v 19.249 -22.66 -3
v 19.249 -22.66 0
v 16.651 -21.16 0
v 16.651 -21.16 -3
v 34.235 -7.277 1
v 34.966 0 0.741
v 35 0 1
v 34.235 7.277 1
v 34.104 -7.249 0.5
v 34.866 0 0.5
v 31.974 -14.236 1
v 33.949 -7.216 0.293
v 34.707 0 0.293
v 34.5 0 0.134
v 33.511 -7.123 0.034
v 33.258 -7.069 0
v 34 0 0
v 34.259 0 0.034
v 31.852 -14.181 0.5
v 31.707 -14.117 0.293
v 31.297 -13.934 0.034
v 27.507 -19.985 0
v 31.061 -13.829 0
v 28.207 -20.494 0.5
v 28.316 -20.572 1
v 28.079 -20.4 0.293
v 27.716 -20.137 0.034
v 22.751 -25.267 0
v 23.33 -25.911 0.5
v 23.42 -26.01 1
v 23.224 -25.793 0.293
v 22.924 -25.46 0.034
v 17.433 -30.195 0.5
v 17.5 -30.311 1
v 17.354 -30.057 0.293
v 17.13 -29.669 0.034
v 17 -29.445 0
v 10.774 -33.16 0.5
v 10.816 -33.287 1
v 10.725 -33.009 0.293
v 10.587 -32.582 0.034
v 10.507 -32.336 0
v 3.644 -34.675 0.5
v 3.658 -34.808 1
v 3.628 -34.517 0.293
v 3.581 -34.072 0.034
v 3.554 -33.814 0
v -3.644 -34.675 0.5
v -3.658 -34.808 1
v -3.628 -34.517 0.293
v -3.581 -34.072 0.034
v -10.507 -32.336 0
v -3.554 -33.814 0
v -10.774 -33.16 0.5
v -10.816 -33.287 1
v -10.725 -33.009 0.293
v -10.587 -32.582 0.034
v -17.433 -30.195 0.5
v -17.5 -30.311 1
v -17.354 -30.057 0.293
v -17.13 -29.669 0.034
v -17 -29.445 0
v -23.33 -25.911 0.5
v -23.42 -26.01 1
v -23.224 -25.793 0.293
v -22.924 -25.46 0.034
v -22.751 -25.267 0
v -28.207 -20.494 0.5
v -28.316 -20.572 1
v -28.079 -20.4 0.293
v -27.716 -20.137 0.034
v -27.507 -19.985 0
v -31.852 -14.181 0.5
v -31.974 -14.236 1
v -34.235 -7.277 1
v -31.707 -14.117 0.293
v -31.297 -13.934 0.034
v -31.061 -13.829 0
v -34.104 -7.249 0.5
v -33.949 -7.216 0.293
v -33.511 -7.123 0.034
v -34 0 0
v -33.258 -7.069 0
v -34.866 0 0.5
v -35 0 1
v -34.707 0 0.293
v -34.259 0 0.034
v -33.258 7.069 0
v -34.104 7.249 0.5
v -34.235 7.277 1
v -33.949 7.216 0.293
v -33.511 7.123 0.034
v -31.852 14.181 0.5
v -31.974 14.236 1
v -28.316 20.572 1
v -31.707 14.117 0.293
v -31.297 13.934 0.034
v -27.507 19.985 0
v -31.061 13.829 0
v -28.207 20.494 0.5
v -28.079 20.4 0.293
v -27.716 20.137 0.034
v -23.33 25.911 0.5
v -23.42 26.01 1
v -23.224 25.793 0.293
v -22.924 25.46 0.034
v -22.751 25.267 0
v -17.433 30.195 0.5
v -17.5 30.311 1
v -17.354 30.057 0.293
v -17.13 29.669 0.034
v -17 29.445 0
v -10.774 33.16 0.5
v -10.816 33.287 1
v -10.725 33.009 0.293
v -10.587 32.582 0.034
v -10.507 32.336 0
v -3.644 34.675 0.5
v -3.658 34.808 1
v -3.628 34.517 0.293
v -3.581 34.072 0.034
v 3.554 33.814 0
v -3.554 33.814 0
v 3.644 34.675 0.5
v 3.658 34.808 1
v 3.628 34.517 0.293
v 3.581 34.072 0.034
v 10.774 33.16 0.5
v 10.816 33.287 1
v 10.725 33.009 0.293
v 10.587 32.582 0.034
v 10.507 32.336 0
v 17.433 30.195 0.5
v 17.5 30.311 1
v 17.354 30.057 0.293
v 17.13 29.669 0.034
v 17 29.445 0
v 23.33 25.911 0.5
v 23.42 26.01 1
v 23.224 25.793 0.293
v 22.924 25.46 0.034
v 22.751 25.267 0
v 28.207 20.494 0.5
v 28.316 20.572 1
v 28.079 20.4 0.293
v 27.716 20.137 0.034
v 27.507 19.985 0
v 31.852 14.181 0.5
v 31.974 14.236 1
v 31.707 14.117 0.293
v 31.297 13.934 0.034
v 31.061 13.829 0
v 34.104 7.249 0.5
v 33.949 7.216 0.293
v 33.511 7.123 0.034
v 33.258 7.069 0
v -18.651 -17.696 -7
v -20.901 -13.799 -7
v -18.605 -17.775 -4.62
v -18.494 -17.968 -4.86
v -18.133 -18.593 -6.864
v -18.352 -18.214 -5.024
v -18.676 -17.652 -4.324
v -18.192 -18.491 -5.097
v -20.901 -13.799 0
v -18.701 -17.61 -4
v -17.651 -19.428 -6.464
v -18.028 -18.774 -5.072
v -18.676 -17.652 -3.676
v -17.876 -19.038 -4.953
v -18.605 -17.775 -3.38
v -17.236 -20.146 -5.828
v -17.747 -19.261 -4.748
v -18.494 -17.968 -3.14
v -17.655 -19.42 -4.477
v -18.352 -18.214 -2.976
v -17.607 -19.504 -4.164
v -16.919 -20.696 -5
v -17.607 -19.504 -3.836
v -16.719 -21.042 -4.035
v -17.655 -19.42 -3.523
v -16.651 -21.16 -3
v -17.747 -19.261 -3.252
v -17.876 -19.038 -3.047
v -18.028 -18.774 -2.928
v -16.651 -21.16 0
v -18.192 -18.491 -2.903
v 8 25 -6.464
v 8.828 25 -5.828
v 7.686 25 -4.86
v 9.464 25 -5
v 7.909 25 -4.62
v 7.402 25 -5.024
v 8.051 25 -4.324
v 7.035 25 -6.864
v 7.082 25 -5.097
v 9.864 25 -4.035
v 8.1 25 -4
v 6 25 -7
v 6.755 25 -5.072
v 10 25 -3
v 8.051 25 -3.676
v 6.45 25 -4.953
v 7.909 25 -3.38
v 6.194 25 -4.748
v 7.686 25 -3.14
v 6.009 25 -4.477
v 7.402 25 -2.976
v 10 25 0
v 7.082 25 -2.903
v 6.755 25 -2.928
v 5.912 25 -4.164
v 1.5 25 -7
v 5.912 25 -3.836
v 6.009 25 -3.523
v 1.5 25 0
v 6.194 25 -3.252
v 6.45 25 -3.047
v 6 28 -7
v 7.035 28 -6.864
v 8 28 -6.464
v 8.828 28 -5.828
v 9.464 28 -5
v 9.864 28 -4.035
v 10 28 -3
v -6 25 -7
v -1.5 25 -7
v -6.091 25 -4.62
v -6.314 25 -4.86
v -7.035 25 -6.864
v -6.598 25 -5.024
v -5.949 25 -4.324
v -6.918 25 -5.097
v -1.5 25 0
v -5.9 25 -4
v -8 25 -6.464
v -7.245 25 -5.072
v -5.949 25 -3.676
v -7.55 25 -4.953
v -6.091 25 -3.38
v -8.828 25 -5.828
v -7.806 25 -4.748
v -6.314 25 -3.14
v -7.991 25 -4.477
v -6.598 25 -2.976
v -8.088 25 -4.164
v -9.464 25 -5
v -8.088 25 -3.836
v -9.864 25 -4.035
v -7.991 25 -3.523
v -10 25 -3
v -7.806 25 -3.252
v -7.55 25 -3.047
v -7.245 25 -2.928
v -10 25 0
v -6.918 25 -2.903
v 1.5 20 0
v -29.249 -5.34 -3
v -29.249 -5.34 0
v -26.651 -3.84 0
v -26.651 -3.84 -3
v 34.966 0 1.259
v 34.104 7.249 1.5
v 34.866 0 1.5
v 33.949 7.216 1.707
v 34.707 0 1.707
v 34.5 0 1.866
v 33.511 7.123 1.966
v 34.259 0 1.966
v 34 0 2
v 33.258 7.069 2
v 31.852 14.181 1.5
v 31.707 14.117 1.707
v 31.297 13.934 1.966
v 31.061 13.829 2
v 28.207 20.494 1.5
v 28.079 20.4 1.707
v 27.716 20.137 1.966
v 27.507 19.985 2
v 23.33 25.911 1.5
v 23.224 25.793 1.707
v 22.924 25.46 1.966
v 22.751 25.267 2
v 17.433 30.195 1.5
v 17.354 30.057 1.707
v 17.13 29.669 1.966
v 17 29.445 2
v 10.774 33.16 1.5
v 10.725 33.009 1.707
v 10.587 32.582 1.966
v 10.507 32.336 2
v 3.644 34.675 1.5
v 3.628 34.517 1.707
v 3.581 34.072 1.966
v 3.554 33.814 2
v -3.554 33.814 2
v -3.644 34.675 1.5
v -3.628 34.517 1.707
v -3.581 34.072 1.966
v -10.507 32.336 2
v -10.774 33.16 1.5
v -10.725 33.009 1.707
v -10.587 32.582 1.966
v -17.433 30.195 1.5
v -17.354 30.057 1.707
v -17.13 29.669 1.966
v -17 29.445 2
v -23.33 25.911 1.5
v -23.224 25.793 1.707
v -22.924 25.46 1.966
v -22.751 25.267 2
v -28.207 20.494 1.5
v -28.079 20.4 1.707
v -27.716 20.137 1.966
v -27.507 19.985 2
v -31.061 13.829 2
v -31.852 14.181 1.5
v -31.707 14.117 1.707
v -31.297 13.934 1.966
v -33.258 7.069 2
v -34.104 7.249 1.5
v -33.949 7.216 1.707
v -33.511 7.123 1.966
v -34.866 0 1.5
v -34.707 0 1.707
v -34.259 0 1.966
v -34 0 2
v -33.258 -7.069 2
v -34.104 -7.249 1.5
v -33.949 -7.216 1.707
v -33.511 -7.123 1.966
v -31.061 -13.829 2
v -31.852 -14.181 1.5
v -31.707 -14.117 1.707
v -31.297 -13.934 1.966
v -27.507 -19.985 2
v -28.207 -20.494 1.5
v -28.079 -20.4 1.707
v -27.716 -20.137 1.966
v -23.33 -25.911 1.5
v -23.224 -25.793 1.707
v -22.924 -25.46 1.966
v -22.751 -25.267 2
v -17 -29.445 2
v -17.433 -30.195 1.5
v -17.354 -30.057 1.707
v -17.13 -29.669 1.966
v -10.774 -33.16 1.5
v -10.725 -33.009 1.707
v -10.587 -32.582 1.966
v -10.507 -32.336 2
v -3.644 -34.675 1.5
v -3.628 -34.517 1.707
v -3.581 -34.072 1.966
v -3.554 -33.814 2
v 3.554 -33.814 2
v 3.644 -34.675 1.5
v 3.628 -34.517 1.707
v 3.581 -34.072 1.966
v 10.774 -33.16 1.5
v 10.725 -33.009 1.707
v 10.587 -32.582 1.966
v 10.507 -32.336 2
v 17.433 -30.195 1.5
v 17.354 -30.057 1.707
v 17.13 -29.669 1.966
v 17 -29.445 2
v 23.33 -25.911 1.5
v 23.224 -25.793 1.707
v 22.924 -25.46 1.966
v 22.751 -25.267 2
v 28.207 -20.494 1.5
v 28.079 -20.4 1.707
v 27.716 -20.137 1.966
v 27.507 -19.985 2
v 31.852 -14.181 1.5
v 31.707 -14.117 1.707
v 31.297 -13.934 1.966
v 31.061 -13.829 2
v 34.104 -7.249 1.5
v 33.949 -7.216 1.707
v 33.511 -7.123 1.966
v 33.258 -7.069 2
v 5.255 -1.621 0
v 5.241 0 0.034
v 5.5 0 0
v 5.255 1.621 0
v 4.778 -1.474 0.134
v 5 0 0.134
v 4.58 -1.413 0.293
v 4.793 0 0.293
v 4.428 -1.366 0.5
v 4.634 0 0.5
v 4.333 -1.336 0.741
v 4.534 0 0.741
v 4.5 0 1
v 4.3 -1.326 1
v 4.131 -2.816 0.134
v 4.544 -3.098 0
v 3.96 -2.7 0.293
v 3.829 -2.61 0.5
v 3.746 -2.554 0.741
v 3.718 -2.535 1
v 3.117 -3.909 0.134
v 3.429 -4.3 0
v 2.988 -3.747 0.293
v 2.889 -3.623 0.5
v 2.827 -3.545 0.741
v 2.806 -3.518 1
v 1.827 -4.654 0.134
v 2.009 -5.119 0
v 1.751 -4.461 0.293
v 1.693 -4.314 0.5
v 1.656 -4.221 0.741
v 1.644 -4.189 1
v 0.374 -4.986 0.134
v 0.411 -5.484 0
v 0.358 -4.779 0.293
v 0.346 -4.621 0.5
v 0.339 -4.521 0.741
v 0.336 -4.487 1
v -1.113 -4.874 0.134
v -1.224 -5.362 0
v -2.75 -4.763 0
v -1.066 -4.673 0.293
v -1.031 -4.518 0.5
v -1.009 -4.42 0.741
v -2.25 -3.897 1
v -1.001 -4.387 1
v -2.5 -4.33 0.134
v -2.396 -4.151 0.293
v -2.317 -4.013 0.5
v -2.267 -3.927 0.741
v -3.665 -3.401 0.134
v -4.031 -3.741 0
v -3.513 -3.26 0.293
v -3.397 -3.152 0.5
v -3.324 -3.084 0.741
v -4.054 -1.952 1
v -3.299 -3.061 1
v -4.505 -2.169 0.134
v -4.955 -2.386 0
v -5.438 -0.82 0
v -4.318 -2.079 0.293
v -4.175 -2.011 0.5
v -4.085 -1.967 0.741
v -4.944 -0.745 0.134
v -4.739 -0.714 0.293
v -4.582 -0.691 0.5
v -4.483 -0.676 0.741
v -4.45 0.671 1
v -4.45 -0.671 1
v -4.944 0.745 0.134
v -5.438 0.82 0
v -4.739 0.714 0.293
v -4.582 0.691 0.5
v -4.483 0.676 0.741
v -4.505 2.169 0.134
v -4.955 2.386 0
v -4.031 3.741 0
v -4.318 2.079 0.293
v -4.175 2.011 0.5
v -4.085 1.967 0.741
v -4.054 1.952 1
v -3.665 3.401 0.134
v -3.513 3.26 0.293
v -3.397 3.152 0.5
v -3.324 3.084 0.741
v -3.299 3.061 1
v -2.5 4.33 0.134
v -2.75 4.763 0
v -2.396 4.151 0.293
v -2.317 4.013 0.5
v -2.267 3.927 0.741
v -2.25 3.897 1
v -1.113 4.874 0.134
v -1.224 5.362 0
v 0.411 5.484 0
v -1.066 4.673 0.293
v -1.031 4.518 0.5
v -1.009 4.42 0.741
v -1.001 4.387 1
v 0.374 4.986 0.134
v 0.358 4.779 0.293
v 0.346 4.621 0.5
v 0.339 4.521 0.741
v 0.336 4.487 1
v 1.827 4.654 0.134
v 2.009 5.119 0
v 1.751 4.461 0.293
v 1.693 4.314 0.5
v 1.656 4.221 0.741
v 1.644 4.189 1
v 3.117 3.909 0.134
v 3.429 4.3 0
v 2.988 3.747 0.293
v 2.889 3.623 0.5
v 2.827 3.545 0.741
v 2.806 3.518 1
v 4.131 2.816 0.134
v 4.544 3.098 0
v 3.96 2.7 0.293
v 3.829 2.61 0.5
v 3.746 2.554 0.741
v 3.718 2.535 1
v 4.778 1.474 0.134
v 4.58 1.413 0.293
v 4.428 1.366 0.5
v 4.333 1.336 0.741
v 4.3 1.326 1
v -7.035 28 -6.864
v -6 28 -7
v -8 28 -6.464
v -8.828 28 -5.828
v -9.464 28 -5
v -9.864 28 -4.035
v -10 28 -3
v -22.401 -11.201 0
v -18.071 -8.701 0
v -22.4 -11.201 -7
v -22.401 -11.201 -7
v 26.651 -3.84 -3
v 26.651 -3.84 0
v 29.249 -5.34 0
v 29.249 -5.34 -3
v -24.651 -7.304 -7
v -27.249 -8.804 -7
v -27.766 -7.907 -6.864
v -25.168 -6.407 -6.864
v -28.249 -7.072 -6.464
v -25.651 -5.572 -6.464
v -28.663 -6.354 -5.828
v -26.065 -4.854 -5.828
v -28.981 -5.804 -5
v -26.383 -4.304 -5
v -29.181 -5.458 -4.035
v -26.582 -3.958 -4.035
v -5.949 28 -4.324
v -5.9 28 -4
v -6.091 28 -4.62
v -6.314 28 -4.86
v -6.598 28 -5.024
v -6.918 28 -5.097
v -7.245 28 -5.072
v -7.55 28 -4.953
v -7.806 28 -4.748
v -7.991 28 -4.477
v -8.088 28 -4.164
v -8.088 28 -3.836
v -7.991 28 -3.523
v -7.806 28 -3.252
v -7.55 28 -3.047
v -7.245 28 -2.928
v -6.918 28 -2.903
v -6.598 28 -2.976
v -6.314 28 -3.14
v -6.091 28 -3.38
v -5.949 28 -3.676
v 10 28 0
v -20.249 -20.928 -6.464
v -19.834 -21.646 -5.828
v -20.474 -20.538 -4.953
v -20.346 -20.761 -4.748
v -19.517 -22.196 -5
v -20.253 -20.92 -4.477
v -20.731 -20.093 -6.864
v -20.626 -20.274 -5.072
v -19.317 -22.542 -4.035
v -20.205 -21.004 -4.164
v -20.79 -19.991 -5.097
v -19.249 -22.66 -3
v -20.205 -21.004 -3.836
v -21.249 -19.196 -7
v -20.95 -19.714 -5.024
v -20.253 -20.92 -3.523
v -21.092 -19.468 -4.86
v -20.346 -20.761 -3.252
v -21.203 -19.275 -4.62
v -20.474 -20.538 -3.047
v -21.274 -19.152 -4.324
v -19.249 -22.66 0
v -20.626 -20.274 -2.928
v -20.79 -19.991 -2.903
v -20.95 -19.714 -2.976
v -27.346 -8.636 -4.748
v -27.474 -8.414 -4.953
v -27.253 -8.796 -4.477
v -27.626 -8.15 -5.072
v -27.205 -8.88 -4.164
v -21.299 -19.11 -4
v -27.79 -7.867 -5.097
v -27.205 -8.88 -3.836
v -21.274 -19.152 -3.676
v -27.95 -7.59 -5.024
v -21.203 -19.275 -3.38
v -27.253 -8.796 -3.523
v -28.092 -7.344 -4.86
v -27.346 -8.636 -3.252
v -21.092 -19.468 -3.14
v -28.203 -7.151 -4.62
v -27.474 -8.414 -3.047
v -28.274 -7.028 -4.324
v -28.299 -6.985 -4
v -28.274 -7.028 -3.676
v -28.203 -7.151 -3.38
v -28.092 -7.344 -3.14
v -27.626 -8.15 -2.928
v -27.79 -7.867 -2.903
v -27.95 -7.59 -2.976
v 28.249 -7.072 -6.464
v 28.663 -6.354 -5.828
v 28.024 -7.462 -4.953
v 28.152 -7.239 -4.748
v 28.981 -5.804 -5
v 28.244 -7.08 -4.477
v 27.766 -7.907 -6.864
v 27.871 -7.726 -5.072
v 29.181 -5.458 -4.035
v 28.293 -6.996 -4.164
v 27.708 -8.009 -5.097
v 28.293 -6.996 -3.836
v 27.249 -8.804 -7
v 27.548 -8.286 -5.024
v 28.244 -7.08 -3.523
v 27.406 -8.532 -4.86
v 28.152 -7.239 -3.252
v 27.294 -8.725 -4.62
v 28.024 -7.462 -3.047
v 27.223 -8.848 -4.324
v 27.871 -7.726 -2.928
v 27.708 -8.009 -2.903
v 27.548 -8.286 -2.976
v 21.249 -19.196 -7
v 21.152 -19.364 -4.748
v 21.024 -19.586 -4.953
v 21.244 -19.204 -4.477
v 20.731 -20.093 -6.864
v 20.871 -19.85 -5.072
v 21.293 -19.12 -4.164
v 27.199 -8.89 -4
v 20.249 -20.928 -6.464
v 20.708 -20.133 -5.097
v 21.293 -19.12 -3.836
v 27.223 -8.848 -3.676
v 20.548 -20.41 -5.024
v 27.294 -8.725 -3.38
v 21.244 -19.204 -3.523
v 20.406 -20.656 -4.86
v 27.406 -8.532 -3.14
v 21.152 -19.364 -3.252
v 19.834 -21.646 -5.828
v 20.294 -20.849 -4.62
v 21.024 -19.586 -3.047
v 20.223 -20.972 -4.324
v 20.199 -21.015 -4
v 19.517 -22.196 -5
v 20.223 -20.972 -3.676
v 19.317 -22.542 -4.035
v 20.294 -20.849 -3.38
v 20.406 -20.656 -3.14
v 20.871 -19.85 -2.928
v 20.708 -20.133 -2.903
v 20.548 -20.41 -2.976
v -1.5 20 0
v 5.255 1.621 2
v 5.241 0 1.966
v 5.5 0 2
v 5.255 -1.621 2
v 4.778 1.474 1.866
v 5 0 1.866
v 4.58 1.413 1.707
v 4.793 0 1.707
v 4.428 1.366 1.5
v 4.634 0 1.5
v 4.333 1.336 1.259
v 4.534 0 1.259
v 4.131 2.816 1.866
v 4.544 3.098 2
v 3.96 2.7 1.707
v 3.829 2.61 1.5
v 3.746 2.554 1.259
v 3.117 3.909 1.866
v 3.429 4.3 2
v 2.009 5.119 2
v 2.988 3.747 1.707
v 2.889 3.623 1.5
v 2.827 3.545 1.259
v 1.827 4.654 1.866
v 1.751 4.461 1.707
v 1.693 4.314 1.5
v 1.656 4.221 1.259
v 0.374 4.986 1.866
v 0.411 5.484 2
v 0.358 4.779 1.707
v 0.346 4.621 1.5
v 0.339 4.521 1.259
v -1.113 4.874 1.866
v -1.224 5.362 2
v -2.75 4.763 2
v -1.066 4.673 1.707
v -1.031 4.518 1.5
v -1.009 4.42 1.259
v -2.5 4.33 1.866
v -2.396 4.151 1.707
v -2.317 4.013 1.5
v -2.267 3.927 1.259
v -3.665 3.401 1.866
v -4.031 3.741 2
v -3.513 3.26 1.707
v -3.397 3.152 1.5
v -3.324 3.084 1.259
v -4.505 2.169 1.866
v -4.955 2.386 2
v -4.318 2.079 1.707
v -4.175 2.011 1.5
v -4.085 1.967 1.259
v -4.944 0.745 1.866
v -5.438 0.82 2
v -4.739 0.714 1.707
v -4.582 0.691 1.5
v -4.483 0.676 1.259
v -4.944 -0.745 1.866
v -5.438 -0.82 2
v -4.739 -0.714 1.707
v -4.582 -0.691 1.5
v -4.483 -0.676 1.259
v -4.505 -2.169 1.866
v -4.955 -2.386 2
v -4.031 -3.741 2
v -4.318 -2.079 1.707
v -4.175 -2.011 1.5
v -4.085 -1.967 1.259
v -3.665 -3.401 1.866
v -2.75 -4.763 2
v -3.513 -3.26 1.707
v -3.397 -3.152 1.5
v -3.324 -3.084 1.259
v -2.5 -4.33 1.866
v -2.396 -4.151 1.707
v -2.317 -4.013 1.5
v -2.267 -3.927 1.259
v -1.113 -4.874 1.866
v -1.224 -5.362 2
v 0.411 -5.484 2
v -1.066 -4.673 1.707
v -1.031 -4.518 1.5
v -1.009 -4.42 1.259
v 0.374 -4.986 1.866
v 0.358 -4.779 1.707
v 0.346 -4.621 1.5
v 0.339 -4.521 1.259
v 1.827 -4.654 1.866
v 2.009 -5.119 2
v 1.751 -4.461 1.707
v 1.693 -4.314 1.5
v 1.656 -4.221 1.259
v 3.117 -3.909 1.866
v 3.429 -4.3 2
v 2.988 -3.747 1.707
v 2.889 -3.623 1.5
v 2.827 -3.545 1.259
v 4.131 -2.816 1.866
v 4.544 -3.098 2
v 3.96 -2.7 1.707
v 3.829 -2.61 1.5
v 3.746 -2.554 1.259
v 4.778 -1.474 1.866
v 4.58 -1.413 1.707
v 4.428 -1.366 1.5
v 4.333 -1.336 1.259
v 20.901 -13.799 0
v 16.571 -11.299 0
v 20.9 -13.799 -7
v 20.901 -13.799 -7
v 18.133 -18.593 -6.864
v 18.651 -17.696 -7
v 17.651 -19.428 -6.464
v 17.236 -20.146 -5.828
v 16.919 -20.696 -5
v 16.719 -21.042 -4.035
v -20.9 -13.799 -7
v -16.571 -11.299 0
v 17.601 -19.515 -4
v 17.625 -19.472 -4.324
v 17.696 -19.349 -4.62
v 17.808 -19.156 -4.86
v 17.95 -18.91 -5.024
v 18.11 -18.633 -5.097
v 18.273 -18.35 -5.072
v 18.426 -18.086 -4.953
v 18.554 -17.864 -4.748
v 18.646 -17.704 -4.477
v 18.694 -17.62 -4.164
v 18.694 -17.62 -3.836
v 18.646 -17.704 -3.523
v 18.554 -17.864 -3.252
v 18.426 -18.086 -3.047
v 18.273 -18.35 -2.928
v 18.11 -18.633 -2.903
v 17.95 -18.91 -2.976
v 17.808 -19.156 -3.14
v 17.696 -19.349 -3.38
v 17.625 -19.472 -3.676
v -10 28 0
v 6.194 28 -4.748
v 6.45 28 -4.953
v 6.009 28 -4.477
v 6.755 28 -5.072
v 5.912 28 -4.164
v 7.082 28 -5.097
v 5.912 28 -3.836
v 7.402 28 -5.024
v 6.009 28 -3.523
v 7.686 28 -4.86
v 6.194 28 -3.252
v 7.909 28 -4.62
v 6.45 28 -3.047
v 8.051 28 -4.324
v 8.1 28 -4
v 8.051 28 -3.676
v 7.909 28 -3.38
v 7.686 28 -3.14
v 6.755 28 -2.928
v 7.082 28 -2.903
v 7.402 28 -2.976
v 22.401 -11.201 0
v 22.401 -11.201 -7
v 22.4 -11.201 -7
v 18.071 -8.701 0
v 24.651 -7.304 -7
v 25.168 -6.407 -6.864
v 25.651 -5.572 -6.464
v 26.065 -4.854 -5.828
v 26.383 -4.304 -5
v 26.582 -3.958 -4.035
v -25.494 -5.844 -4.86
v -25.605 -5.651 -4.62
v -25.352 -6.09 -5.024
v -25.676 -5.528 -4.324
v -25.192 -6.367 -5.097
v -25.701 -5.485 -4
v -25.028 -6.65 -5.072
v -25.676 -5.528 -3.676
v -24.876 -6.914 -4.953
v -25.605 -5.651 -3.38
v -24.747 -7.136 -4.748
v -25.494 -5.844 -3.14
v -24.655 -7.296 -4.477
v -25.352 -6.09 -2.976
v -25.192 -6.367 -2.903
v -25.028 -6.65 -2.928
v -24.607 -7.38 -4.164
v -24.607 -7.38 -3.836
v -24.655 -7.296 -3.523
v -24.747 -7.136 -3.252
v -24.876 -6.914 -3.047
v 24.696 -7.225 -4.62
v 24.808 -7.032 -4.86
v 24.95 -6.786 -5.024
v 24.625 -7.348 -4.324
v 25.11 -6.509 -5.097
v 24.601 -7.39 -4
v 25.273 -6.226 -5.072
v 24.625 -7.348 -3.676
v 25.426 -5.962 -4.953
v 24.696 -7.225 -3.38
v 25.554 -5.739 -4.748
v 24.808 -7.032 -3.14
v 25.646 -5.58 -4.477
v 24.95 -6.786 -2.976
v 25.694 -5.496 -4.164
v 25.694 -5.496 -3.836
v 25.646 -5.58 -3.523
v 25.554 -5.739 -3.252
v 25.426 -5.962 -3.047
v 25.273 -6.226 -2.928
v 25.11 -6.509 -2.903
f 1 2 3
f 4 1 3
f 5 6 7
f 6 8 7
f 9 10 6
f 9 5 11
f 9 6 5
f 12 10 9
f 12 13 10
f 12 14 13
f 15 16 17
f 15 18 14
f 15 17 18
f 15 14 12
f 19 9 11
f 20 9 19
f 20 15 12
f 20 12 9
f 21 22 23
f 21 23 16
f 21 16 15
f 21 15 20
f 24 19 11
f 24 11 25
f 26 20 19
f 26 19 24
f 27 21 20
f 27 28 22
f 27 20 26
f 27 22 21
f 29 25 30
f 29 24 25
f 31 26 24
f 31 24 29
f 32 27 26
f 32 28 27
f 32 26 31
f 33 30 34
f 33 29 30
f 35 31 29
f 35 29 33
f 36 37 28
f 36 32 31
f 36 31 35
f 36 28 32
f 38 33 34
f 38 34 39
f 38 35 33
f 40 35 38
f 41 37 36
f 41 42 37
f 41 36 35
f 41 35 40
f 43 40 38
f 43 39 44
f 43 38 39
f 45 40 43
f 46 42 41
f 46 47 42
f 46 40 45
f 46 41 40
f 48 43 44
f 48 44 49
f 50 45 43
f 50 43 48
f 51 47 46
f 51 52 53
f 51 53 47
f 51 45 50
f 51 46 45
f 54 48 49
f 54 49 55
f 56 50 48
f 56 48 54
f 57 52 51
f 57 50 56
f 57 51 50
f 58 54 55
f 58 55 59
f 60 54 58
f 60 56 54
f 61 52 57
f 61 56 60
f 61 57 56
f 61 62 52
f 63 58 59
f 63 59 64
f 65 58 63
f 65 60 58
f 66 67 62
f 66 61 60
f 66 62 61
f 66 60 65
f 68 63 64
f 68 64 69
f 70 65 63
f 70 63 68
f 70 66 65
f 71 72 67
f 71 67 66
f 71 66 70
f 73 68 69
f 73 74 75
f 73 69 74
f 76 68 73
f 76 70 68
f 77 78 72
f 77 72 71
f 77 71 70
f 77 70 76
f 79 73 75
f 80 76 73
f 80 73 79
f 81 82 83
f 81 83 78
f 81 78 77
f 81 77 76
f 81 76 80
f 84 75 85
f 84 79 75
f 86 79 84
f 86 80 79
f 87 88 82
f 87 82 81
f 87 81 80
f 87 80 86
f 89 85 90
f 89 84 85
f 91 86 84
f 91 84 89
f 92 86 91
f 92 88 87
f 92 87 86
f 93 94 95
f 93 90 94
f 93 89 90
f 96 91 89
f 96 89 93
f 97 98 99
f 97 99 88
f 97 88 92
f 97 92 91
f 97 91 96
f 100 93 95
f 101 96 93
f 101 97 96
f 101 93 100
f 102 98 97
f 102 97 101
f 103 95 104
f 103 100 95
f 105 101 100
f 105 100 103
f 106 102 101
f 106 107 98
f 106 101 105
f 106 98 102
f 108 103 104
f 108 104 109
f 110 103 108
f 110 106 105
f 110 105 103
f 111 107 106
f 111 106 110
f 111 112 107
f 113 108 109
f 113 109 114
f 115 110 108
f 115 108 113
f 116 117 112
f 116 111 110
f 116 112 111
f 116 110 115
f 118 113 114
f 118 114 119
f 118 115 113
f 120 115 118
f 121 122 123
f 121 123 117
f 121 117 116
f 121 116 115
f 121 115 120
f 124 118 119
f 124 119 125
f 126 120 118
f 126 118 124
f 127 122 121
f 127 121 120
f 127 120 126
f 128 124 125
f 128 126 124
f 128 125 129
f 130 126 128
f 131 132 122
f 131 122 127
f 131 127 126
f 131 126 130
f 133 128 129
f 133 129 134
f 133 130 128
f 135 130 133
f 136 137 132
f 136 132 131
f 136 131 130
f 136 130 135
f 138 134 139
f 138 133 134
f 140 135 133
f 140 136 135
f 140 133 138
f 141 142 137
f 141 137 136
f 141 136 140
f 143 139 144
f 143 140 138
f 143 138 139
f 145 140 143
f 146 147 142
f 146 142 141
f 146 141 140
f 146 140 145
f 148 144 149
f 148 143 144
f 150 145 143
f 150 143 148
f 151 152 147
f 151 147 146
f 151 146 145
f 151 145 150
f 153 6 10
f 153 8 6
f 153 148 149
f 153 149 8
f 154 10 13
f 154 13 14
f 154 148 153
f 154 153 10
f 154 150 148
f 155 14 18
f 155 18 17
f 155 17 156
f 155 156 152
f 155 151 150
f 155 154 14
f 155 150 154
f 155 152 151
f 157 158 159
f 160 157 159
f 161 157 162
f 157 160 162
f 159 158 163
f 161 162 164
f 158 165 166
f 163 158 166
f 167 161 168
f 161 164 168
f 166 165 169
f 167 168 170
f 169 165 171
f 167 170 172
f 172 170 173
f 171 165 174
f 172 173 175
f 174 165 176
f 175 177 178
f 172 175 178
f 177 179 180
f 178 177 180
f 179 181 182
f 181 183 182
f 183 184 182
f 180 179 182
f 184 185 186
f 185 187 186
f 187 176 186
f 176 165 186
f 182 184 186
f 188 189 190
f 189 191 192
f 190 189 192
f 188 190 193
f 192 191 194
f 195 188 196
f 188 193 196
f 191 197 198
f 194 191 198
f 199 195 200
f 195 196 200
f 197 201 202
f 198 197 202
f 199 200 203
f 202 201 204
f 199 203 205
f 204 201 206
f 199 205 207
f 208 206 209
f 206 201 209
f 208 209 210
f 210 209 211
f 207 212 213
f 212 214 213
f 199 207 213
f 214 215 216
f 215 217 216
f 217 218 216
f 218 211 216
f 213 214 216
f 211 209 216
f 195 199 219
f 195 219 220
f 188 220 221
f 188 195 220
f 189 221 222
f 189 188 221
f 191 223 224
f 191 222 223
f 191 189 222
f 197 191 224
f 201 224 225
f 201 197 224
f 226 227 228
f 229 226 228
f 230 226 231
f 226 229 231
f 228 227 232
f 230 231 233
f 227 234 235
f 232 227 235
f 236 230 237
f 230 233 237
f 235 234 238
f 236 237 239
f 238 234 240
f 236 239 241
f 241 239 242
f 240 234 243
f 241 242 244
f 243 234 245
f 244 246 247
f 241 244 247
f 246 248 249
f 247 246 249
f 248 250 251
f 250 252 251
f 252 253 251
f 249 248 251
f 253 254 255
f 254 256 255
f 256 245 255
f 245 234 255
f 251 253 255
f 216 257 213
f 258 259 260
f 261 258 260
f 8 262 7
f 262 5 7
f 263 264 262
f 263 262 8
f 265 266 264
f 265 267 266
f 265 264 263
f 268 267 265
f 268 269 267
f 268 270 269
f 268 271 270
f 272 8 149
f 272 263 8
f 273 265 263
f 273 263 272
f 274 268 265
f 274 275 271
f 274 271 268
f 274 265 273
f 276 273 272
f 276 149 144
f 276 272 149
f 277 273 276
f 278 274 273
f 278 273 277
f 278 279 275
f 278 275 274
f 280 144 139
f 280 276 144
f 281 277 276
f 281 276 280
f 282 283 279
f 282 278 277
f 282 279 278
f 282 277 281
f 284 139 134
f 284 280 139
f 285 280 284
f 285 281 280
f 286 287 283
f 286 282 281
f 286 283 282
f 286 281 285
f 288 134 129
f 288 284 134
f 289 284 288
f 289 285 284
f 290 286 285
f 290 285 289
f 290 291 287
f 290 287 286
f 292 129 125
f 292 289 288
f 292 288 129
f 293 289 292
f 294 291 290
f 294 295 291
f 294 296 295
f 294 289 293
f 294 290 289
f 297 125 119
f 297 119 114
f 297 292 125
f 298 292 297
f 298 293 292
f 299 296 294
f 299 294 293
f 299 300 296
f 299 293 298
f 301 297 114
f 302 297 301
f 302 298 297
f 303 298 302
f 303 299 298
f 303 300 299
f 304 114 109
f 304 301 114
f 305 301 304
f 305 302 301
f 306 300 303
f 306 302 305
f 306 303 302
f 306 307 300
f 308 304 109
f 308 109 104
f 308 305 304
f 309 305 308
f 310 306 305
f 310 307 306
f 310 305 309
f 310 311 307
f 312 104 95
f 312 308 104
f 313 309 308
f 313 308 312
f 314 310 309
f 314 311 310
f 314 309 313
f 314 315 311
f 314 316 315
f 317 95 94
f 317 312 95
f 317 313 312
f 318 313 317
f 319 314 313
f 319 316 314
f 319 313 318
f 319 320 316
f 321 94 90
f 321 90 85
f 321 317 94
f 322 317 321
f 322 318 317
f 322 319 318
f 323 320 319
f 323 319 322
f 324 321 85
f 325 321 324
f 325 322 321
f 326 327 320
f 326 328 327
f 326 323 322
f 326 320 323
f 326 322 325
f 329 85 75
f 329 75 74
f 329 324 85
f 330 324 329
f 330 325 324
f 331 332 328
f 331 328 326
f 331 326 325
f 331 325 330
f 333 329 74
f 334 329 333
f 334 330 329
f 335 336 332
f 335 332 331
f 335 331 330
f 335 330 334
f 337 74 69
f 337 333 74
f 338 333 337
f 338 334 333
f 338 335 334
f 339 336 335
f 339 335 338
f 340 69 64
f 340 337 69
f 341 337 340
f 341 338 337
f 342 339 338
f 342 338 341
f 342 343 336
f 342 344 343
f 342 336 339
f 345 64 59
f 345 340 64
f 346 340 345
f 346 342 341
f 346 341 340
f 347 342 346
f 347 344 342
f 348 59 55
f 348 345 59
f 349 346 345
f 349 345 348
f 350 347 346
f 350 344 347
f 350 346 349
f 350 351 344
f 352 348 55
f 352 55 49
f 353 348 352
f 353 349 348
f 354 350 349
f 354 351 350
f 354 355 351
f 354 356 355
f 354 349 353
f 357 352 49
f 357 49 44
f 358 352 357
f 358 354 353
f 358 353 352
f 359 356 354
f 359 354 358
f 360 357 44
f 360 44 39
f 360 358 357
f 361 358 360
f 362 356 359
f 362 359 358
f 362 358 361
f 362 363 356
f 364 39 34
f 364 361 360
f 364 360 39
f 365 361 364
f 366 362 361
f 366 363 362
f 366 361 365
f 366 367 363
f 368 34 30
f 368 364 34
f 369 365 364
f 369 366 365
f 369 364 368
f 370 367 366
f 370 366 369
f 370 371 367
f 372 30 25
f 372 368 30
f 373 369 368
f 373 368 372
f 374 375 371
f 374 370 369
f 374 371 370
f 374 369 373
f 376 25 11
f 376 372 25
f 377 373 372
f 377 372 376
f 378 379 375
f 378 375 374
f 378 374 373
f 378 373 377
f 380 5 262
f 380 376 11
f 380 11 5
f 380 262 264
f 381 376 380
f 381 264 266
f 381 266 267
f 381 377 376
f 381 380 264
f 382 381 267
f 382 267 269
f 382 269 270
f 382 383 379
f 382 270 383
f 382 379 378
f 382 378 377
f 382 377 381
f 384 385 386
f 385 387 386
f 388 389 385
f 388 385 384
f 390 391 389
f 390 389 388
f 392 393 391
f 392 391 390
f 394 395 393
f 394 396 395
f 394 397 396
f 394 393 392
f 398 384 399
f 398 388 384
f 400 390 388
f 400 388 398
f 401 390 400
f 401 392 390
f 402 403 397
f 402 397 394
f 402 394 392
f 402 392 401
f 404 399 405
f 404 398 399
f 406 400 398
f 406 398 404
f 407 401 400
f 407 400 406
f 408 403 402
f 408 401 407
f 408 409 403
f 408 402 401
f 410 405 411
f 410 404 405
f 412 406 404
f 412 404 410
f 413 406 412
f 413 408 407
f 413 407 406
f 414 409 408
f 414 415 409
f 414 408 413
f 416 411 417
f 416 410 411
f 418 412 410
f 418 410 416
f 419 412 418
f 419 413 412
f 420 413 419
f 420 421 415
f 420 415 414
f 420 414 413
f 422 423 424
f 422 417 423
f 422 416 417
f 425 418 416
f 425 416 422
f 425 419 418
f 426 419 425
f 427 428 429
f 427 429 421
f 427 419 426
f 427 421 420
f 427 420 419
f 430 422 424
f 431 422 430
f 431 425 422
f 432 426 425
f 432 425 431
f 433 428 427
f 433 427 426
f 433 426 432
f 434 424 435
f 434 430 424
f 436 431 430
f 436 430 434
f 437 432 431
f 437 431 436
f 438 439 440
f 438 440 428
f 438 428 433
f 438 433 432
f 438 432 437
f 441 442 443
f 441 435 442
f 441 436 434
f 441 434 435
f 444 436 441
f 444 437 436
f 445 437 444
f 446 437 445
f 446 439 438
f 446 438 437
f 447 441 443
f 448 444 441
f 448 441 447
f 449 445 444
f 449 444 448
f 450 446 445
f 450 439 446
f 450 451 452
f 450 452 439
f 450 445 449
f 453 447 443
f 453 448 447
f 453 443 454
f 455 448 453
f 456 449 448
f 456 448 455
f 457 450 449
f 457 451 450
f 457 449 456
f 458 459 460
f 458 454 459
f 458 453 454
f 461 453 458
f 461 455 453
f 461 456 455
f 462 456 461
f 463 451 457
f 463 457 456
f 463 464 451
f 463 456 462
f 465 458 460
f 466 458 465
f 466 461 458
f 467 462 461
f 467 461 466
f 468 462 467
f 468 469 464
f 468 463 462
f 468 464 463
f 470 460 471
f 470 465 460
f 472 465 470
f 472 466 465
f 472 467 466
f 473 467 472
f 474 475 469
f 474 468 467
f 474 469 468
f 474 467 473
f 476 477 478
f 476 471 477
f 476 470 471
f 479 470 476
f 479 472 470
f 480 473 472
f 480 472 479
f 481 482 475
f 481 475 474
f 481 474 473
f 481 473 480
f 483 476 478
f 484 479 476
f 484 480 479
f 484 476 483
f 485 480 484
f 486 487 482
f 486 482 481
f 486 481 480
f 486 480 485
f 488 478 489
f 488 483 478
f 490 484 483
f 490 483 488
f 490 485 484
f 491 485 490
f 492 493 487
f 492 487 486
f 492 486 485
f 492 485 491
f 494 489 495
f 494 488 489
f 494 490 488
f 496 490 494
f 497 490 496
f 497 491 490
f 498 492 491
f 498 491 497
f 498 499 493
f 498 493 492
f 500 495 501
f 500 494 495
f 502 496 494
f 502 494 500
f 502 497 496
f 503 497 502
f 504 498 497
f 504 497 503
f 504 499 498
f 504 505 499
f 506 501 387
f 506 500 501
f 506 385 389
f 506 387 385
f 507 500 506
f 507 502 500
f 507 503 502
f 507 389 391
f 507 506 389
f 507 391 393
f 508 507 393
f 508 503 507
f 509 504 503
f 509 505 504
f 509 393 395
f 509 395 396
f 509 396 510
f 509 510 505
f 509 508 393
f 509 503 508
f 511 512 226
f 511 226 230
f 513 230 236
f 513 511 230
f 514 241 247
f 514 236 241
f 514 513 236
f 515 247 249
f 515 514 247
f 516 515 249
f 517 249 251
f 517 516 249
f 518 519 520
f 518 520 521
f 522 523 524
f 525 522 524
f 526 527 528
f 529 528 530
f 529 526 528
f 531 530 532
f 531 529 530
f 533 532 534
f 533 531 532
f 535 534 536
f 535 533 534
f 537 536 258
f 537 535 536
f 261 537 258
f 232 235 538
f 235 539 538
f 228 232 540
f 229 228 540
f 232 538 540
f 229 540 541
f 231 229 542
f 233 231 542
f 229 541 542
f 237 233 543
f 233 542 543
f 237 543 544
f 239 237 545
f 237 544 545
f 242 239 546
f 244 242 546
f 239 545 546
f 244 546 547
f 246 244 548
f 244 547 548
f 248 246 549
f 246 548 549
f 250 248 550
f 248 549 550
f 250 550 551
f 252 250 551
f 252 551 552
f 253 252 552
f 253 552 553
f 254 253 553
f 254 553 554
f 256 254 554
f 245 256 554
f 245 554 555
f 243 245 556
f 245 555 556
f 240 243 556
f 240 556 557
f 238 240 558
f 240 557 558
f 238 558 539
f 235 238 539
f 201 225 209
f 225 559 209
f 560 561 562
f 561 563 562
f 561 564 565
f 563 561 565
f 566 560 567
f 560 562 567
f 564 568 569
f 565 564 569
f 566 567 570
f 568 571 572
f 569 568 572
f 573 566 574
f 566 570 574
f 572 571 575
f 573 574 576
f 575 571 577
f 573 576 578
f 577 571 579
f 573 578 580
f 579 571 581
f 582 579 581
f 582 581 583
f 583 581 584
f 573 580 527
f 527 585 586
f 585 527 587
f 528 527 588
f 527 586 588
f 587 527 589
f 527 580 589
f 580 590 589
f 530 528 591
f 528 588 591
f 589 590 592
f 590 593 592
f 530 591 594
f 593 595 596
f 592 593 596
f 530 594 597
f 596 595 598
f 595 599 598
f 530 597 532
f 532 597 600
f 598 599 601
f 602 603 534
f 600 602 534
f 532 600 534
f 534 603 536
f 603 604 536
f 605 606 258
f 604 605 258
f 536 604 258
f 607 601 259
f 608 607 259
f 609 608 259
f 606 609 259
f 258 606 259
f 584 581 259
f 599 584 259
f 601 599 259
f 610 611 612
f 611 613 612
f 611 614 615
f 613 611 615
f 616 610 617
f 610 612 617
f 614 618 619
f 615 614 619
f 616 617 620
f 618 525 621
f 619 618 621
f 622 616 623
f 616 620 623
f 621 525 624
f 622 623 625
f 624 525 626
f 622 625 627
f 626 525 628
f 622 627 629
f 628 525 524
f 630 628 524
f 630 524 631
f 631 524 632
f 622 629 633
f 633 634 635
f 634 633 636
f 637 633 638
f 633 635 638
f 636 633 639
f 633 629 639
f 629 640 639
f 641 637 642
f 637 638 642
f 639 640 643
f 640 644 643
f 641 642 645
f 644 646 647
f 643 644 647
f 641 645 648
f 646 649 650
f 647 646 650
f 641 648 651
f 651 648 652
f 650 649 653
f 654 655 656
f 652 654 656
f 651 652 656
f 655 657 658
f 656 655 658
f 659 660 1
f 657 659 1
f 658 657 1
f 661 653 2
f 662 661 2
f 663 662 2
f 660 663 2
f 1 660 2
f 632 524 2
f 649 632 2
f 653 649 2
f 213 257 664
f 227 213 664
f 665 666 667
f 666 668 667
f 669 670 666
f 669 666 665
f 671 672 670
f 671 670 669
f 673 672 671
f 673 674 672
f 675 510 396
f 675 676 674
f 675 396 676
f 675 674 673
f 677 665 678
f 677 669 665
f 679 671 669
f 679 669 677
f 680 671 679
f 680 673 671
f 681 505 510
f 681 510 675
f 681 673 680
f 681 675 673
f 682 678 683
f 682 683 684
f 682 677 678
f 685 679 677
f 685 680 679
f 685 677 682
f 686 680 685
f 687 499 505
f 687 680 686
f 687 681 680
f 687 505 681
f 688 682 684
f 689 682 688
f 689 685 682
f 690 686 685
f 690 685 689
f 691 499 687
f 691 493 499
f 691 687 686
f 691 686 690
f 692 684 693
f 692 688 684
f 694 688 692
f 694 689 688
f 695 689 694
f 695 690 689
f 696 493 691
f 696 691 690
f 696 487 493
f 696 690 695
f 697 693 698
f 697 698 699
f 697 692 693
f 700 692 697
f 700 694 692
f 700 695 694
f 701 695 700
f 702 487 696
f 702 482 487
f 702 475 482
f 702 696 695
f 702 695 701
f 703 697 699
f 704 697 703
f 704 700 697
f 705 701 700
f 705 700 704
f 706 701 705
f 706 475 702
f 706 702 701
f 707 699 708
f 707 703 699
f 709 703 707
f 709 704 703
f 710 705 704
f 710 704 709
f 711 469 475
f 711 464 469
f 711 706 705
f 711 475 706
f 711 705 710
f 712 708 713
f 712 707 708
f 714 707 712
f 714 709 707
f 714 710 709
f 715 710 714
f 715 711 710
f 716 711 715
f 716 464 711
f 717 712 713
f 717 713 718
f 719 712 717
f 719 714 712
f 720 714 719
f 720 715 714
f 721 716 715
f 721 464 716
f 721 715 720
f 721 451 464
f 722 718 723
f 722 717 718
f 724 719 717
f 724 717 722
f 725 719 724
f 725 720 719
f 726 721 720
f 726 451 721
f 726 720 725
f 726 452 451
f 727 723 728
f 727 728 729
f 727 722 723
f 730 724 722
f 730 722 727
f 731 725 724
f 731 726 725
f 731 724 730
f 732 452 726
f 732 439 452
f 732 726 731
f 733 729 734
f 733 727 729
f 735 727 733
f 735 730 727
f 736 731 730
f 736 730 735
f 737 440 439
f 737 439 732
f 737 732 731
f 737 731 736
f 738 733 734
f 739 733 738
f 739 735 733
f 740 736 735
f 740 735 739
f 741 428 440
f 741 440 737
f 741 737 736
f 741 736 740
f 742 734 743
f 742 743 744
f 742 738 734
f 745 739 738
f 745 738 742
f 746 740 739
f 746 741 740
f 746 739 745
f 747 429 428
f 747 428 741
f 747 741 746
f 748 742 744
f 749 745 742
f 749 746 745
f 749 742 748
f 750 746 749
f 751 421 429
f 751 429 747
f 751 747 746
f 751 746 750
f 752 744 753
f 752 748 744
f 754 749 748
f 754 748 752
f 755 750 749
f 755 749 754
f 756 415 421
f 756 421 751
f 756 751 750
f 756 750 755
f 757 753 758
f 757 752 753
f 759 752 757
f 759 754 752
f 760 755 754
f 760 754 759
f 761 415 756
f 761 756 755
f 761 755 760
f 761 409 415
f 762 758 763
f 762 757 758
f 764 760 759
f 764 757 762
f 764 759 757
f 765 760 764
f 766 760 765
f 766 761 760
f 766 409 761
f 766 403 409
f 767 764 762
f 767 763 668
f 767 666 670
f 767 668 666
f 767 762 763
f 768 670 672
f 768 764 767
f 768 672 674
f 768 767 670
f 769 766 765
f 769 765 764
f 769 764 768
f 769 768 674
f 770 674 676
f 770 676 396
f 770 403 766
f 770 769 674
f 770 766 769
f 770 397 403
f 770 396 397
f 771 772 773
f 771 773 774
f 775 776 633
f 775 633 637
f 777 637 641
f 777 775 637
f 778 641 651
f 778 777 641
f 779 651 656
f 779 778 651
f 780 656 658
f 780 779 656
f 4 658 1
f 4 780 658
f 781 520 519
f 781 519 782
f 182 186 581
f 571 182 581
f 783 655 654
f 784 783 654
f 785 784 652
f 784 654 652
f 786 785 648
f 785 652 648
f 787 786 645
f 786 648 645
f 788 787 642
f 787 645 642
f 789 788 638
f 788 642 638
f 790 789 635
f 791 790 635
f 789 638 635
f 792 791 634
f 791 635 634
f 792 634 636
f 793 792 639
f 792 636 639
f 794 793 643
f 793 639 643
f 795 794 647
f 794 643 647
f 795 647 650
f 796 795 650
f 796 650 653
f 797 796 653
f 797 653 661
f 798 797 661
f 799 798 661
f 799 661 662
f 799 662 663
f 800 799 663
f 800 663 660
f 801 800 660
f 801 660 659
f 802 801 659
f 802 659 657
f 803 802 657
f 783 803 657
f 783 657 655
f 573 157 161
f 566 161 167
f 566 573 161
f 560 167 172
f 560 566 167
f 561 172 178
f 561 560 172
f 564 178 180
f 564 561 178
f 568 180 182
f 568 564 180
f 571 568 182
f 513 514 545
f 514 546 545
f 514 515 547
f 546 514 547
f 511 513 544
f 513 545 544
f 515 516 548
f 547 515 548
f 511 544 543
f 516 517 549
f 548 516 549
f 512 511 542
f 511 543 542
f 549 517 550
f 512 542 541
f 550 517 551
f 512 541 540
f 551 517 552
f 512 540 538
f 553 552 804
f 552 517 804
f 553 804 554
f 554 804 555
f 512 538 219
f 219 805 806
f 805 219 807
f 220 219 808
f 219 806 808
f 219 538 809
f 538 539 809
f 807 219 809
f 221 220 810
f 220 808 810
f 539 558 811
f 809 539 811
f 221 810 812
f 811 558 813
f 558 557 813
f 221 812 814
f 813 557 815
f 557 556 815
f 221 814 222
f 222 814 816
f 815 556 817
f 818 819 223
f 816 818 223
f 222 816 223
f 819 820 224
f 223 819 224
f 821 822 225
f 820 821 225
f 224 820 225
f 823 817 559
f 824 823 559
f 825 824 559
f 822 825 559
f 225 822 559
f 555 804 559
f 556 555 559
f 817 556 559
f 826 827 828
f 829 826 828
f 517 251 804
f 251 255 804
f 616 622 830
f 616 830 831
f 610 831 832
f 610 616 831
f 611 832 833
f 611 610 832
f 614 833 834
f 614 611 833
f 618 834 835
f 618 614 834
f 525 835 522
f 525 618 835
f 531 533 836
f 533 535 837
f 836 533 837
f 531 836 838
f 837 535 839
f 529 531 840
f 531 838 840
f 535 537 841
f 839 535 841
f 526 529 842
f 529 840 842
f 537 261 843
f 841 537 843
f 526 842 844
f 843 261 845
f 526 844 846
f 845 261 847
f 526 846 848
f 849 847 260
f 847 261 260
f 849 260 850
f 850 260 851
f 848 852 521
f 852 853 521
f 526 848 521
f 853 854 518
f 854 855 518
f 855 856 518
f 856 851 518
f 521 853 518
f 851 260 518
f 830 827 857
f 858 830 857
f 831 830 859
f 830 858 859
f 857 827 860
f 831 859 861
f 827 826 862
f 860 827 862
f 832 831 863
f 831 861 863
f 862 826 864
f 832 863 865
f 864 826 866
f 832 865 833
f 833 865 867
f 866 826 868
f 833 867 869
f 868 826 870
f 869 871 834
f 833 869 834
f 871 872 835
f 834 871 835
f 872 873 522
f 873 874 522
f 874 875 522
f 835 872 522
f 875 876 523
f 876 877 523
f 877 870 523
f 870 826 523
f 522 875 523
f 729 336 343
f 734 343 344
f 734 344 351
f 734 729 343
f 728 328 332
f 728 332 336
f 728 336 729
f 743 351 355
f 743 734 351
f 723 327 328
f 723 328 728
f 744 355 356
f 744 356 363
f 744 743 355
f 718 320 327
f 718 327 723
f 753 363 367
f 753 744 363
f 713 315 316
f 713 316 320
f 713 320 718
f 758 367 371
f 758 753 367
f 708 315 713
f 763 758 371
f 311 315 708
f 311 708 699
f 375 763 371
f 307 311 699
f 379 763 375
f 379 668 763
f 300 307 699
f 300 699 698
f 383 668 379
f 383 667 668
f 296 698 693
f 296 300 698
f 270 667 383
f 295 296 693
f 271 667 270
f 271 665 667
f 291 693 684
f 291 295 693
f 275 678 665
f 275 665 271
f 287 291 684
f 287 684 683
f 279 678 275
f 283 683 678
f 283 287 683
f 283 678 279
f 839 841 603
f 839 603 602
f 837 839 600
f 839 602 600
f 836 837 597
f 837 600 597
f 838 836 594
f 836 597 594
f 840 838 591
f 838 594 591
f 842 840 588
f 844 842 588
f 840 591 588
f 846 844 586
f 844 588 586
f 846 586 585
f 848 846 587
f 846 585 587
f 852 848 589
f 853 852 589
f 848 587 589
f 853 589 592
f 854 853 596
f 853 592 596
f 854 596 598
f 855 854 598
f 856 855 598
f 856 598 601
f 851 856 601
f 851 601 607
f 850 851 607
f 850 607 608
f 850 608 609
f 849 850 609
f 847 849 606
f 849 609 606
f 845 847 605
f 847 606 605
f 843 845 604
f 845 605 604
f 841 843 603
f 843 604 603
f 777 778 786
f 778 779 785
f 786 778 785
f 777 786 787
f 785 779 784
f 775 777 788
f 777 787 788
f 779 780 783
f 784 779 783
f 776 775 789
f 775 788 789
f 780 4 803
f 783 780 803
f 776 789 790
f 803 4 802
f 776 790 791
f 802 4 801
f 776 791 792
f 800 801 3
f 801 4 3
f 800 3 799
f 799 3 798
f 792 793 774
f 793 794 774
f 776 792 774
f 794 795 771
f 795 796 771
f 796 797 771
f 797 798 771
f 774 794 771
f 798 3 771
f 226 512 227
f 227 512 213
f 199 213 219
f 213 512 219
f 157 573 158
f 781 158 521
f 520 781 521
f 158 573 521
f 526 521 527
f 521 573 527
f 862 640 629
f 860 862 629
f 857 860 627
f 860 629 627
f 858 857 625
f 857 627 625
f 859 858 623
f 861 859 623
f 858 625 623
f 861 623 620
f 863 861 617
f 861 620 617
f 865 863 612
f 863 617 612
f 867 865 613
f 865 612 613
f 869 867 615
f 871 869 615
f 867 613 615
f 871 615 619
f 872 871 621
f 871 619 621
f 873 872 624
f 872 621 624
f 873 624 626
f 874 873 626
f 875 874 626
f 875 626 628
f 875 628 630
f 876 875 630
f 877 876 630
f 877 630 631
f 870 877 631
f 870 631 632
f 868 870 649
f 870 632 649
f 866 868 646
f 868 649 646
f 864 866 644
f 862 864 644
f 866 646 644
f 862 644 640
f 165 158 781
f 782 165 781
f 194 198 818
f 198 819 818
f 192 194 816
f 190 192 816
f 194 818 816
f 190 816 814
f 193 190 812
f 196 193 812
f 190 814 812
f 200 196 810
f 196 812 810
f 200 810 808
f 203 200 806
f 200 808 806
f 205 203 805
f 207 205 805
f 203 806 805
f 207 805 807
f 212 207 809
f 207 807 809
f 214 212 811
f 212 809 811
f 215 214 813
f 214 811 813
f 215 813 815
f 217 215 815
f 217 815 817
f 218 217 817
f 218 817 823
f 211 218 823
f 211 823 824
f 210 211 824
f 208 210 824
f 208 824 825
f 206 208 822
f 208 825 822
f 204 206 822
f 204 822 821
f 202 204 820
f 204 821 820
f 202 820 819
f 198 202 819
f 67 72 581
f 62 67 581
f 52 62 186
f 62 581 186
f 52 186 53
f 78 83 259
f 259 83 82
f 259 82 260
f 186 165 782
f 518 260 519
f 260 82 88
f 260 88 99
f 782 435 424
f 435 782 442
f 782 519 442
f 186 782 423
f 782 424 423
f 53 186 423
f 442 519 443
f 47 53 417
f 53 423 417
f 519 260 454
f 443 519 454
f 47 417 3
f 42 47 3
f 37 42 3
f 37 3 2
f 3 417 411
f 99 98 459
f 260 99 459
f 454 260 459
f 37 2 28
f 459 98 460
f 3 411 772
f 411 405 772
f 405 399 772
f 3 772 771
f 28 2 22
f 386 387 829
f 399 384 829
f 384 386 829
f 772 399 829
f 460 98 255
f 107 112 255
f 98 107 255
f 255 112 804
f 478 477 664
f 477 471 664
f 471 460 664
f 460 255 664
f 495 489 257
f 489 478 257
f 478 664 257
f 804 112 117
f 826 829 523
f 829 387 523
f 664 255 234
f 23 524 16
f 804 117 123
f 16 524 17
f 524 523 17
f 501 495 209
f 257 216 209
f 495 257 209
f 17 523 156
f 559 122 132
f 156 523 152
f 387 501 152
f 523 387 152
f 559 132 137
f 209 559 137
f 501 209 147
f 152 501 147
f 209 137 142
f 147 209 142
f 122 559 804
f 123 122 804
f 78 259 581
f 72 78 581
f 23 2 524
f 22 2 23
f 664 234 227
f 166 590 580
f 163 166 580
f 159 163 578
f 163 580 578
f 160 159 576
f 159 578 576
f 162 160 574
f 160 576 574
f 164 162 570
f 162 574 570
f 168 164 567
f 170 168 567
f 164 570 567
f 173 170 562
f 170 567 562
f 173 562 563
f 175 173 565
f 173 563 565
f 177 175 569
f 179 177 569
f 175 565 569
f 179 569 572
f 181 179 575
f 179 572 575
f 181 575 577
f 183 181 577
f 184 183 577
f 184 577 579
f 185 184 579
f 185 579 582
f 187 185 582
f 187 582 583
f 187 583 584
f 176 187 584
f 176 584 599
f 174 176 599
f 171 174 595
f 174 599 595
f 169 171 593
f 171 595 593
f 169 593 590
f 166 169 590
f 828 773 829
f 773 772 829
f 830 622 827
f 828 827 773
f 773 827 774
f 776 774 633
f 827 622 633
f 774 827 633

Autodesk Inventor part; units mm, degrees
ref_plane "YZ Plane" through (0, 0, 0) normal (1, 0, 0) x (0, 1, 0)
ref_plane "XZ Plane" through (0, 0, 0) normal (0, 1, 0) x (-1, 0, 0)
ref_plane "XY Plane" through (0, 0, 0) normal (0, 0, 1) x (1, 0, 0)
sketch "Skizze1" plane through (0, 0, 0) normal (0, 0, 1) x (1, 0, 0)
  line L0 (-49, 0) -> (49, 0) construction
  circle A0 centre (0, 0) radius 35
  line L1 (-10, 28) -> (10, 28)
  line L2 (10, 28) -> (10, 25)
  line L3 (10, 25) -> (-10, 25)
  line L4 (-10, 25) -> (-10, 28)
  line L5 (1.5, 25) -> (-1.5, 25)
  line L6 (-1.5, 25) -> (-1.5, 20)
  line L7 (-1.5, 20) -> (1.5, 20)
  line L8 (1.5, 20) -> (1.5, 25)
  circle A1 centre (0, 0) radius 4.5
  line L9 (0, 49) -> (0, -49) construction
  dimension "d9" = 70
  dimension "d10" = 3
  dimension "d11" = 25
  dimension "d14" = 20
  dimension "d23" = 5
  dimension "d62" = 9
extrude "Extrusion3" add sketch "Skizze1" against normal blind 7 contours L1 L2 L3 L4 | L3 L8 L7 L6
fillet "Rundung1" radius 4 2 edges at (-10, 26.5, -7) (10, 26.5, -7)
sketch "Skizze2" plane through (-10, 28, 0) normal (0, 1, 0) x (1, 0, 0)
  circle A0 centre (3, 4) radius 1.1
  circle A1 centre (17, 4) radius 1.1
  line L0 (10, 0) -> (10, 7) construction
  line L1 (43, 0) -> (-27, 0) construction
  line L2 (-1.6221, 4) -> (19.0112, 4) construction
  line L3 (4, 7) -> (16, 7) construction
  line L4 (0, 0) -> (0, 3) projected
  dimension "d16" = 2.2
  dimension "d20" = 3
  dimension "d21" = 3
extrude "Extrusion4" cut sketch "Skizze2" against normal up to next
chamfer "Fase1" distance 5 distance2 7 1 edges at (0, 20, -7) measured on face at (0.5, 27, -7)
pattern_circular "Runde Anordnung1" count 3 over 360 about axis through (0, 0, -10) along (0, 0, 1) of "Extrusion3", "Extrusion4", "Fase1", "Rundung1"
extrude "Extrusion11" add sketch "Skizze1" along normal blind 2 contours A0 | L1 L2 L3 L4 | L3 L8 L7 L6
fillet "Rundung5" radius 1 4 edges at (-35, 0, 2) (-4.5, 0, 2) (-4.5, 0, 0) (-35, 0, 0)
equation "\"d21\" = d20"
properties part number "Stewart-Sym-Base"
